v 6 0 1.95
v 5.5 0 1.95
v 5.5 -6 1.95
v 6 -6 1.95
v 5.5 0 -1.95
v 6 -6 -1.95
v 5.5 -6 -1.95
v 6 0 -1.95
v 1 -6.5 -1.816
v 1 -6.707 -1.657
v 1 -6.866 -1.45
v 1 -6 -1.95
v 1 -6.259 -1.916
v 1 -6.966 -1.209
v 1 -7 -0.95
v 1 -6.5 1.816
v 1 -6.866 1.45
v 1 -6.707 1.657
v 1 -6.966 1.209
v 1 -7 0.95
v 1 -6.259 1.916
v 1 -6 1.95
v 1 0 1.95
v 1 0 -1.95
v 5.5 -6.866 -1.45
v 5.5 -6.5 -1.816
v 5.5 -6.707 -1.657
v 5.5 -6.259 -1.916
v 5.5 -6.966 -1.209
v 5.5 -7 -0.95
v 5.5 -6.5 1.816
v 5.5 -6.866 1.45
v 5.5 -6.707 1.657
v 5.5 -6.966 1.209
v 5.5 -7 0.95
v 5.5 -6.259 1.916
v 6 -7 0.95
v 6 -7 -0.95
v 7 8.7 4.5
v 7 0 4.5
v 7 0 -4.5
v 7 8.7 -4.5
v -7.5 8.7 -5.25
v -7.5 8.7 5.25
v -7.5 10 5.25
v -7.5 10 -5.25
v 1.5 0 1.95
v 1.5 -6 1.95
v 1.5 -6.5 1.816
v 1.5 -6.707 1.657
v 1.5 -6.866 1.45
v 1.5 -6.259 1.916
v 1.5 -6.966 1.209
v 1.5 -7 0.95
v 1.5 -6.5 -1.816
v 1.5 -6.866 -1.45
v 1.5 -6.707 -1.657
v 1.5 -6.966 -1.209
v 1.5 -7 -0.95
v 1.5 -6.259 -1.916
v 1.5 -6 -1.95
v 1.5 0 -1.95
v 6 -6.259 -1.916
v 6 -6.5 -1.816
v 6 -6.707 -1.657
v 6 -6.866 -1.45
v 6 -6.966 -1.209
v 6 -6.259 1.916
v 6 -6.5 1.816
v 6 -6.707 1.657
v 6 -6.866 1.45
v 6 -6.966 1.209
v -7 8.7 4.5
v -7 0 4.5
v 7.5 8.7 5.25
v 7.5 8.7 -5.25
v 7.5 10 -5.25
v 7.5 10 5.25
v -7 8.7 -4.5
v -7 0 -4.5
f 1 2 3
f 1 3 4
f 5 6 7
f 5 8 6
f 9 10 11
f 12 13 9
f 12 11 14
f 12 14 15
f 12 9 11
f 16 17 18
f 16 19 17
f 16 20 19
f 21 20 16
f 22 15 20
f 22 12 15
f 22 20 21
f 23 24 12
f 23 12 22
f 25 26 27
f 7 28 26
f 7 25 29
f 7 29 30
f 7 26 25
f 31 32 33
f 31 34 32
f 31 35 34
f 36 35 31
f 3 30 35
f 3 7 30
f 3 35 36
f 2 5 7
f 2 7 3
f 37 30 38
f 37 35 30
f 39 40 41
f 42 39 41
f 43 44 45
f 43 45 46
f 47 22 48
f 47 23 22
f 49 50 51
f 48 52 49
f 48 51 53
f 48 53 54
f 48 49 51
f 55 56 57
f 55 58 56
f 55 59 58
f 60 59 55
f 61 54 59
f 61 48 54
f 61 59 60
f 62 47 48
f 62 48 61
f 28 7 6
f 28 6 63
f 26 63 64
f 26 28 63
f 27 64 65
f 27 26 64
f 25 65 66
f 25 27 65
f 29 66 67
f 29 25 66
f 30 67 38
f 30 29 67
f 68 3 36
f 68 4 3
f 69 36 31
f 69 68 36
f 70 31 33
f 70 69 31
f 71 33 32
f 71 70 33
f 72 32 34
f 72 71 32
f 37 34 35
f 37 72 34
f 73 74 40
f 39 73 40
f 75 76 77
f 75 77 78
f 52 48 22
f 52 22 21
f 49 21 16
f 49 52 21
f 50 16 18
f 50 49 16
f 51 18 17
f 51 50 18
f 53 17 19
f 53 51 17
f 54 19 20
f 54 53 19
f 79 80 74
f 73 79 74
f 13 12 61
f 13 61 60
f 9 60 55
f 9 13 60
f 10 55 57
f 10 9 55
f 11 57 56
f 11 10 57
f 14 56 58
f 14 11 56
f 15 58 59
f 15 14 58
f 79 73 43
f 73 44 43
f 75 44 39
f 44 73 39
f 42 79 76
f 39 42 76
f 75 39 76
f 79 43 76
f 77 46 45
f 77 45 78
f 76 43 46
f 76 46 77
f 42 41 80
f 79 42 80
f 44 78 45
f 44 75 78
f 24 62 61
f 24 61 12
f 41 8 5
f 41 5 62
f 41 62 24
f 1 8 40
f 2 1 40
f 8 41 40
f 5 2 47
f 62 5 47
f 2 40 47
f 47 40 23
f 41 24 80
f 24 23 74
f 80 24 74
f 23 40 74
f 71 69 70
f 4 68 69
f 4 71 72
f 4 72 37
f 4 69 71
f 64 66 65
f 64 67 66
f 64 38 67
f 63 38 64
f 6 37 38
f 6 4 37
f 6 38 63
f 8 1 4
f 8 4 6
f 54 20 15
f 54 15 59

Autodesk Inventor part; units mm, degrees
ref_plane "YZ Plane" through (0, 0, 0) normal (1, 0, 0) x (0, 1, 0)
ref_plane "XZ Plane" through (0, 0, 0) normal (0, 1, 0) x (-1, 0, 0)
ref_plane "XY Plane" through (0, 0, 0) normal (0, 0, 1) x (1, 0, 0)
sketch "スケッチ1" plane through (0, 0, 0) normal (0, 1, 0) x (-1, 0, 0)
  line L0 (7, 4.5) -> (-7, 4.5)
  line L1 (-7, 4.5) -> (-7, -4.5)
  line L2 (-7, -4.5) -> (7, -4.5)
  line L3 (7, -4.5) -> (7, 4.5)
  line L4 (7, 4.5) -> (-7, -4.5) construction
  line L5 (-7, 4.5) -> (7, -4.5) construction
  point P0 (0, 0)
  dimension "d0" = 14
  dimension "d1" = 9
extrude "押し出し1" add sketch "スケッチ1" along normal blind 8.7
sketch "スケッチ2" plane through (0, 8.7, 0) normal (0, 1, 0) x (1, 0, 0)
  line L0 (7.5, -5.25) -> (-7.5, -5.25)
  line L1 (-7.5, -5.25) -> (-7.5, 5.25)
  line L2 (-7.5, 5.25) -> (7.5, 5.25)
  line L3 (7.5, 5.25) -> (7.5, -5.25)
  line L4 (7.5, -5.25) -> (-7.5, 5.25) construction
  line L5 (-7.5, -5.25) -> (7.5, 5.25) construction
  point P0 (0, 0)
  dimension "d4" = 10.5
  dimension "d5" = 15
extrude "押し出し2" add sketch "スケッチ2" along normal blind 1.3
sketch "スケッチ3" plane through (0, 0, 0) normal (0, -1, 0) x (1, 0, 0)
  line L0 (5.5, 1.95) -> (6, 1.95)
  line L1 (6, 1.95) -> (6, -1.95)
  line L2 (6, -1.95) -> (5.5, -1.95)
  line L3 (5.5, -1.95) -> (5.5, 1.95)
  line L4 (1, 1.95) -> (1.5, 1.95)
  line L5 (1.5, 1.95) -> (1.5, -1.95)
  line L6 (1.5, -1.95) -> (1, -1.95)
  line L7 (1, -1.95) -> (1, 1.95)
  line L8 (7, 4.5) -> (7, -4.5) projected
  point P0 (0, 0)
  point P1 (1, 0)
  point P2 (6, 0)
  point P3 (7, 0)
  dimension "d10" = 4
  dimension "d11" = 0.5
  dimension "d12" = 3.9
  dimension "d13" = 1
extrude "押し出し3" add sketch "スケッチ3" along normal blind 7
fillet "フィレット1" radius 1 4 edges at (5.75, -7, -1.95) (5.75, -7, 1.95) (1.25, -7, -1.95) (1.25, -7, 1.95)
properties part number "switch"
